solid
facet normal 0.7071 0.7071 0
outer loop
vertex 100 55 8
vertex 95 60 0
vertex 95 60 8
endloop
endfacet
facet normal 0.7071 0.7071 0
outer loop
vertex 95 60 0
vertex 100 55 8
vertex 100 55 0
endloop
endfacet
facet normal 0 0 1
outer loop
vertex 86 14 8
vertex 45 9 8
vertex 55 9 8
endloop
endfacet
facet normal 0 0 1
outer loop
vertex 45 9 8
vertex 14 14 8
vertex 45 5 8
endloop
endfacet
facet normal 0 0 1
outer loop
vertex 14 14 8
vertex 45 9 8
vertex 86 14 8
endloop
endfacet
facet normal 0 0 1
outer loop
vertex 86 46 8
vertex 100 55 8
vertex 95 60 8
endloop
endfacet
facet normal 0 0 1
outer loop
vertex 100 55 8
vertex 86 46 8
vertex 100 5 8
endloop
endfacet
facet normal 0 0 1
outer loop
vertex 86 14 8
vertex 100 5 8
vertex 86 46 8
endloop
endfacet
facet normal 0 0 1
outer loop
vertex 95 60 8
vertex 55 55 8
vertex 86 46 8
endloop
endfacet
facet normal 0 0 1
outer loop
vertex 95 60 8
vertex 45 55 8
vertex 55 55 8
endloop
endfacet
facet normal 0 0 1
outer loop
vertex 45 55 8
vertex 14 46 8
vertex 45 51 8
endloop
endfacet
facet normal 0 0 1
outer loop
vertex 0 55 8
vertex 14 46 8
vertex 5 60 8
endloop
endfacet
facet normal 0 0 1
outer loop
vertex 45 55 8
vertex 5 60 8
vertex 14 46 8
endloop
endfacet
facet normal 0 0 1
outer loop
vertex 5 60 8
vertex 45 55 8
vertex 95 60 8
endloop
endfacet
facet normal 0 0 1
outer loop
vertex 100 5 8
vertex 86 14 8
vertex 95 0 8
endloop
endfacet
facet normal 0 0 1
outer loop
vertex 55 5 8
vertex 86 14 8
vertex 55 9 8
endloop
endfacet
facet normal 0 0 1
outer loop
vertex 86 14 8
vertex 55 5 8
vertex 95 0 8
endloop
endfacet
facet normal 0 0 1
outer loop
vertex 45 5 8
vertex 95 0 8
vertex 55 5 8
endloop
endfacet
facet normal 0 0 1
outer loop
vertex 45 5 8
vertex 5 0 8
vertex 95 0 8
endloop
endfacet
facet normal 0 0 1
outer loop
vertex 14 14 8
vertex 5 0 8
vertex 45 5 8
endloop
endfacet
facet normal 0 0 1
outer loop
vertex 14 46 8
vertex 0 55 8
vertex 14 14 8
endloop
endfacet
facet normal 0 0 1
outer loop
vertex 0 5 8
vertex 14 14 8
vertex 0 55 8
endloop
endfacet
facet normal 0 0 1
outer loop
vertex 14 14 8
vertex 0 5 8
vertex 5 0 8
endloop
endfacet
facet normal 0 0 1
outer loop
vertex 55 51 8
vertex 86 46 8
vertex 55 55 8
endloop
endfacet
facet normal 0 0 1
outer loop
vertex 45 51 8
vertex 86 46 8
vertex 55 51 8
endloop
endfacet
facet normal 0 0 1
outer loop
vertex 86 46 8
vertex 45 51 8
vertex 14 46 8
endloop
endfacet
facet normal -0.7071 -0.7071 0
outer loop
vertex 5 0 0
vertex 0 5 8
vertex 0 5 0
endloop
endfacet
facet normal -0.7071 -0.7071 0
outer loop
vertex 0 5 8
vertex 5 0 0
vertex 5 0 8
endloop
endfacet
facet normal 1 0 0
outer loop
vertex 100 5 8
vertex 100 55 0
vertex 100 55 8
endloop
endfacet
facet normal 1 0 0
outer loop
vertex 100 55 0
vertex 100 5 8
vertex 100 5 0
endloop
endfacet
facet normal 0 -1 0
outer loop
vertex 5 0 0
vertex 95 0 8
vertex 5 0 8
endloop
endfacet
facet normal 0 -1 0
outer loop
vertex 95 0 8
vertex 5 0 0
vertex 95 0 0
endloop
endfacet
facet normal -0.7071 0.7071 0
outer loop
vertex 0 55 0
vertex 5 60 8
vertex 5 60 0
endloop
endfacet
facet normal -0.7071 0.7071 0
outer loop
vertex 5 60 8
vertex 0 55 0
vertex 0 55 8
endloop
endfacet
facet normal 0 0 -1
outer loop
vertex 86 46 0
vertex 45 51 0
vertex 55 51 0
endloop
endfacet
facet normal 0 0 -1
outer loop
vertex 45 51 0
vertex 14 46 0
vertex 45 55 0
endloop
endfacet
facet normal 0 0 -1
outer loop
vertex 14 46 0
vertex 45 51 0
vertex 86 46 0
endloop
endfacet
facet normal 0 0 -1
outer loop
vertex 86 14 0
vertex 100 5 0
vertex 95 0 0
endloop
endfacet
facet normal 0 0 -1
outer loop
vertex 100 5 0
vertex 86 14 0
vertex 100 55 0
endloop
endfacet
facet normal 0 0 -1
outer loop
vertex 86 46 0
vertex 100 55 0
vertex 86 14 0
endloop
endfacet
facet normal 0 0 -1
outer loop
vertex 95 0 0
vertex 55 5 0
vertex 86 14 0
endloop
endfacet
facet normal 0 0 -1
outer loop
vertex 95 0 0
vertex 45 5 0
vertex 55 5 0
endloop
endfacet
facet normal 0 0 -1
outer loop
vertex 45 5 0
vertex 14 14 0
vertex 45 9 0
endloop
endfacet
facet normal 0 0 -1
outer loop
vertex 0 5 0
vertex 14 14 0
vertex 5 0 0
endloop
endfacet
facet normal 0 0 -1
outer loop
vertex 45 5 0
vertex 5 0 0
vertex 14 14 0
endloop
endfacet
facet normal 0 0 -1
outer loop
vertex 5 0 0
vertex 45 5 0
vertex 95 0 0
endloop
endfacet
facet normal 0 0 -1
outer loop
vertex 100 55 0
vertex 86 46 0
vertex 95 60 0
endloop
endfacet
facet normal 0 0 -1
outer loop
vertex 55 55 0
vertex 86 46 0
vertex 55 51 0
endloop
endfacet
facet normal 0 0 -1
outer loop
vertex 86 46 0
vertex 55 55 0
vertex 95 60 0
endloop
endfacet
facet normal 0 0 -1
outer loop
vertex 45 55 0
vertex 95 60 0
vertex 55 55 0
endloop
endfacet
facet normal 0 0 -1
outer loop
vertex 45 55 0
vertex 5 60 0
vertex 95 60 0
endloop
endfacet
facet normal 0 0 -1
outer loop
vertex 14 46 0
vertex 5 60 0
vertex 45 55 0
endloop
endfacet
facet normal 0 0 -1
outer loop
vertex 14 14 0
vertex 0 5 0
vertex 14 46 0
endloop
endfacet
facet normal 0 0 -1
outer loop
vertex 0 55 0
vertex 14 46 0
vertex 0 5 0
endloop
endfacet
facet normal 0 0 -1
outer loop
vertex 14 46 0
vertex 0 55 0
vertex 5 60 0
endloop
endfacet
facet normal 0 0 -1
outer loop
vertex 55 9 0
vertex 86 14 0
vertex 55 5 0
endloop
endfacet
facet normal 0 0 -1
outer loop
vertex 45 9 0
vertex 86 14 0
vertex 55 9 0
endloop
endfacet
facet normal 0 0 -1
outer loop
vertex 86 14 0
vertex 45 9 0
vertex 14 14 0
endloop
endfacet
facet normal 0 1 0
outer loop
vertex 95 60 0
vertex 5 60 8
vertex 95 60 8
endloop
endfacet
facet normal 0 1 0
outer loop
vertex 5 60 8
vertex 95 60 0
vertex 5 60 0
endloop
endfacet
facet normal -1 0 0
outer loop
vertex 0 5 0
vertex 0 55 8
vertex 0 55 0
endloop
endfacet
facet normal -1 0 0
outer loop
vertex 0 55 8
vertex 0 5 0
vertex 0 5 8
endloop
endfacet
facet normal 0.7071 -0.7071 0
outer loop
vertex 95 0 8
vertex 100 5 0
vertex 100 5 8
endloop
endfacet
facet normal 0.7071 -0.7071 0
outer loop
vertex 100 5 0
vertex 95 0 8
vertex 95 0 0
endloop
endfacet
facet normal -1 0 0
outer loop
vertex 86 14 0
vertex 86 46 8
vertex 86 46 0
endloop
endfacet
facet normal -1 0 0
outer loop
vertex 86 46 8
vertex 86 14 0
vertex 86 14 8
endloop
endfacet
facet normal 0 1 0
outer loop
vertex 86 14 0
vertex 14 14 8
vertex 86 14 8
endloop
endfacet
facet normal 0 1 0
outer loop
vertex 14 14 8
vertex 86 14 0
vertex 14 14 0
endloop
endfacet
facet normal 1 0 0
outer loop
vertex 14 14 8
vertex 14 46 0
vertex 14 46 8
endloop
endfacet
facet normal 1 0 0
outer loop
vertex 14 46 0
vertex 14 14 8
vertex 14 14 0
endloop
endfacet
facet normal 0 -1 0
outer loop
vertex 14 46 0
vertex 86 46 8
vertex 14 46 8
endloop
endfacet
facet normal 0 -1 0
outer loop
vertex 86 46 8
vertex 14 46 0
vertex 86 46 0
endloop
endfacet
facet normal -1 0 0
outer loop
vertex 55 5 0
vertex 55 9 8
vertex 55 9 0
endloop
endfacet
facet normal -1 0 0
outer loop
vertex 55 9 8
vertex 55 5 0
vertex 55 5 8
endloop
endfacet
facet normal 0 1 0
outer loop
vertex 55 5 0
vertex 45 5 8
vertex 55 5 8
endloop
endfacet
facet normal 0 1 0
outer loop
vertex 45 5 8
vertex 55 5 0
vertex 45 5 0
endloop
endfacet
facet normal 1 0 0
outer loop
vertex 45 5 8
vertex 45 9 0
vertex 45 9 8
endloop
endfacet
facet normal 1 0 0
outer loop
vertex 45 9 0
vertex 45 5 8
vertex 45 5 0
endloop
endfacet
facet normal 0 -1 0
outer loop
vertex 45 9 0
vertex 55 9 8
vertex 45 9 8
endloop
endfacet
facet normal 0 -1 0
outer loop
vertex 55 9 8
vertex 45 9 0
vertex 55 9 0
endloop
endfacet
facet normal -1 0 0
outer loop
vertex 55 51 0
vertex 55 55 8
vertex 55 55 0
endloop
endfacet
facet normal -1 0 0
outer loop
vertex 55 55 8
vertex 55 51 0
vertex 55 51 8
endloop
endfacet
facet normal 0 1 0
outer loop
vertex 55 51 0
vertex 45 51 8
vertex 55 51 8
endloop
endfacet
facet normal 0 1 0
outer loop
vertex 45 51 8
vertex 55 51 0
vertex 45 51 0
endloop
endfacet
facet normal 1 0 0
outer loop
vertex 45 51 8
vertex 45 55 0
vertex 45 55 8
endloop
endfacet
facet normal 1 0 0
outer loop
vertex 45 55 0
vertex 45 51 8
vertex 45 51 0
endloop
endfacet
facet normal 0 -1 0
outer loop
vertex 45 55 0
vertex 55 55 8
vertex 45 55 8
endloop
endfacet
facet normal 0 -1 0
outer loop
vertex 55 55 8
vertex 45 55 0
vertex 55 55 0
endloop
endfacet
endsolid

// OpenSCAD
$fn = 32;

// ----------------------------------------------------------------------
// Frame plate: 100 x 60 frame, 14 mm rails
// ----------------------------------------------------------------------

// --- parameters (mm) ---
plate_l = 100;            // plate length, X
plate_w = 60;             // plate width, Y
plate_t = 8;              // plate thickness, Z (extrusion height)
corner_c = 5;             // corner chamfer
frame_bar = 14;           // frame rail width
slot_l = 10;              // adjustment slot length
slot_w = 4;               // adjustment slot width

win_l = plate_l - 2 * frame_bar;  // window length
win_w = plate_w - 2 * frame_bar;  // window width

profile = [[5, 0], [95, 0], [100, 5], [100, 55], [95, 60], [5, 60], [0, 55], [0, 5]];  // primary outline, 8 points, counter clockwise
void_1 = [[14, 14], [86, 14], [86, 46], [14, 46]];  // the window, 4 points
void_2 = [[45, 5], [55, 5], [55, 9], [45, 9]];  // adjustment slot, 4 points
void_3 = [[45, 51], [55, 51], [55, 55], [45, 55]];  // adjustment slot, 4 points

// --- the one profile operation ---
difference() {
  linear_extrude(height = plate_t) polygon(points = profile);
  translate([0, 0, -1])
    linear_extrude(height = plate_t + 2) polygon(points = void_1);
  translate([0, 0, -1])
    linear_extrude(height = plate_t + 2) polygon(points = void_2);
  translate([0, 0, -1])
    linear_extrude(height = plate_t + 2) polygon(points = void_3);
}
